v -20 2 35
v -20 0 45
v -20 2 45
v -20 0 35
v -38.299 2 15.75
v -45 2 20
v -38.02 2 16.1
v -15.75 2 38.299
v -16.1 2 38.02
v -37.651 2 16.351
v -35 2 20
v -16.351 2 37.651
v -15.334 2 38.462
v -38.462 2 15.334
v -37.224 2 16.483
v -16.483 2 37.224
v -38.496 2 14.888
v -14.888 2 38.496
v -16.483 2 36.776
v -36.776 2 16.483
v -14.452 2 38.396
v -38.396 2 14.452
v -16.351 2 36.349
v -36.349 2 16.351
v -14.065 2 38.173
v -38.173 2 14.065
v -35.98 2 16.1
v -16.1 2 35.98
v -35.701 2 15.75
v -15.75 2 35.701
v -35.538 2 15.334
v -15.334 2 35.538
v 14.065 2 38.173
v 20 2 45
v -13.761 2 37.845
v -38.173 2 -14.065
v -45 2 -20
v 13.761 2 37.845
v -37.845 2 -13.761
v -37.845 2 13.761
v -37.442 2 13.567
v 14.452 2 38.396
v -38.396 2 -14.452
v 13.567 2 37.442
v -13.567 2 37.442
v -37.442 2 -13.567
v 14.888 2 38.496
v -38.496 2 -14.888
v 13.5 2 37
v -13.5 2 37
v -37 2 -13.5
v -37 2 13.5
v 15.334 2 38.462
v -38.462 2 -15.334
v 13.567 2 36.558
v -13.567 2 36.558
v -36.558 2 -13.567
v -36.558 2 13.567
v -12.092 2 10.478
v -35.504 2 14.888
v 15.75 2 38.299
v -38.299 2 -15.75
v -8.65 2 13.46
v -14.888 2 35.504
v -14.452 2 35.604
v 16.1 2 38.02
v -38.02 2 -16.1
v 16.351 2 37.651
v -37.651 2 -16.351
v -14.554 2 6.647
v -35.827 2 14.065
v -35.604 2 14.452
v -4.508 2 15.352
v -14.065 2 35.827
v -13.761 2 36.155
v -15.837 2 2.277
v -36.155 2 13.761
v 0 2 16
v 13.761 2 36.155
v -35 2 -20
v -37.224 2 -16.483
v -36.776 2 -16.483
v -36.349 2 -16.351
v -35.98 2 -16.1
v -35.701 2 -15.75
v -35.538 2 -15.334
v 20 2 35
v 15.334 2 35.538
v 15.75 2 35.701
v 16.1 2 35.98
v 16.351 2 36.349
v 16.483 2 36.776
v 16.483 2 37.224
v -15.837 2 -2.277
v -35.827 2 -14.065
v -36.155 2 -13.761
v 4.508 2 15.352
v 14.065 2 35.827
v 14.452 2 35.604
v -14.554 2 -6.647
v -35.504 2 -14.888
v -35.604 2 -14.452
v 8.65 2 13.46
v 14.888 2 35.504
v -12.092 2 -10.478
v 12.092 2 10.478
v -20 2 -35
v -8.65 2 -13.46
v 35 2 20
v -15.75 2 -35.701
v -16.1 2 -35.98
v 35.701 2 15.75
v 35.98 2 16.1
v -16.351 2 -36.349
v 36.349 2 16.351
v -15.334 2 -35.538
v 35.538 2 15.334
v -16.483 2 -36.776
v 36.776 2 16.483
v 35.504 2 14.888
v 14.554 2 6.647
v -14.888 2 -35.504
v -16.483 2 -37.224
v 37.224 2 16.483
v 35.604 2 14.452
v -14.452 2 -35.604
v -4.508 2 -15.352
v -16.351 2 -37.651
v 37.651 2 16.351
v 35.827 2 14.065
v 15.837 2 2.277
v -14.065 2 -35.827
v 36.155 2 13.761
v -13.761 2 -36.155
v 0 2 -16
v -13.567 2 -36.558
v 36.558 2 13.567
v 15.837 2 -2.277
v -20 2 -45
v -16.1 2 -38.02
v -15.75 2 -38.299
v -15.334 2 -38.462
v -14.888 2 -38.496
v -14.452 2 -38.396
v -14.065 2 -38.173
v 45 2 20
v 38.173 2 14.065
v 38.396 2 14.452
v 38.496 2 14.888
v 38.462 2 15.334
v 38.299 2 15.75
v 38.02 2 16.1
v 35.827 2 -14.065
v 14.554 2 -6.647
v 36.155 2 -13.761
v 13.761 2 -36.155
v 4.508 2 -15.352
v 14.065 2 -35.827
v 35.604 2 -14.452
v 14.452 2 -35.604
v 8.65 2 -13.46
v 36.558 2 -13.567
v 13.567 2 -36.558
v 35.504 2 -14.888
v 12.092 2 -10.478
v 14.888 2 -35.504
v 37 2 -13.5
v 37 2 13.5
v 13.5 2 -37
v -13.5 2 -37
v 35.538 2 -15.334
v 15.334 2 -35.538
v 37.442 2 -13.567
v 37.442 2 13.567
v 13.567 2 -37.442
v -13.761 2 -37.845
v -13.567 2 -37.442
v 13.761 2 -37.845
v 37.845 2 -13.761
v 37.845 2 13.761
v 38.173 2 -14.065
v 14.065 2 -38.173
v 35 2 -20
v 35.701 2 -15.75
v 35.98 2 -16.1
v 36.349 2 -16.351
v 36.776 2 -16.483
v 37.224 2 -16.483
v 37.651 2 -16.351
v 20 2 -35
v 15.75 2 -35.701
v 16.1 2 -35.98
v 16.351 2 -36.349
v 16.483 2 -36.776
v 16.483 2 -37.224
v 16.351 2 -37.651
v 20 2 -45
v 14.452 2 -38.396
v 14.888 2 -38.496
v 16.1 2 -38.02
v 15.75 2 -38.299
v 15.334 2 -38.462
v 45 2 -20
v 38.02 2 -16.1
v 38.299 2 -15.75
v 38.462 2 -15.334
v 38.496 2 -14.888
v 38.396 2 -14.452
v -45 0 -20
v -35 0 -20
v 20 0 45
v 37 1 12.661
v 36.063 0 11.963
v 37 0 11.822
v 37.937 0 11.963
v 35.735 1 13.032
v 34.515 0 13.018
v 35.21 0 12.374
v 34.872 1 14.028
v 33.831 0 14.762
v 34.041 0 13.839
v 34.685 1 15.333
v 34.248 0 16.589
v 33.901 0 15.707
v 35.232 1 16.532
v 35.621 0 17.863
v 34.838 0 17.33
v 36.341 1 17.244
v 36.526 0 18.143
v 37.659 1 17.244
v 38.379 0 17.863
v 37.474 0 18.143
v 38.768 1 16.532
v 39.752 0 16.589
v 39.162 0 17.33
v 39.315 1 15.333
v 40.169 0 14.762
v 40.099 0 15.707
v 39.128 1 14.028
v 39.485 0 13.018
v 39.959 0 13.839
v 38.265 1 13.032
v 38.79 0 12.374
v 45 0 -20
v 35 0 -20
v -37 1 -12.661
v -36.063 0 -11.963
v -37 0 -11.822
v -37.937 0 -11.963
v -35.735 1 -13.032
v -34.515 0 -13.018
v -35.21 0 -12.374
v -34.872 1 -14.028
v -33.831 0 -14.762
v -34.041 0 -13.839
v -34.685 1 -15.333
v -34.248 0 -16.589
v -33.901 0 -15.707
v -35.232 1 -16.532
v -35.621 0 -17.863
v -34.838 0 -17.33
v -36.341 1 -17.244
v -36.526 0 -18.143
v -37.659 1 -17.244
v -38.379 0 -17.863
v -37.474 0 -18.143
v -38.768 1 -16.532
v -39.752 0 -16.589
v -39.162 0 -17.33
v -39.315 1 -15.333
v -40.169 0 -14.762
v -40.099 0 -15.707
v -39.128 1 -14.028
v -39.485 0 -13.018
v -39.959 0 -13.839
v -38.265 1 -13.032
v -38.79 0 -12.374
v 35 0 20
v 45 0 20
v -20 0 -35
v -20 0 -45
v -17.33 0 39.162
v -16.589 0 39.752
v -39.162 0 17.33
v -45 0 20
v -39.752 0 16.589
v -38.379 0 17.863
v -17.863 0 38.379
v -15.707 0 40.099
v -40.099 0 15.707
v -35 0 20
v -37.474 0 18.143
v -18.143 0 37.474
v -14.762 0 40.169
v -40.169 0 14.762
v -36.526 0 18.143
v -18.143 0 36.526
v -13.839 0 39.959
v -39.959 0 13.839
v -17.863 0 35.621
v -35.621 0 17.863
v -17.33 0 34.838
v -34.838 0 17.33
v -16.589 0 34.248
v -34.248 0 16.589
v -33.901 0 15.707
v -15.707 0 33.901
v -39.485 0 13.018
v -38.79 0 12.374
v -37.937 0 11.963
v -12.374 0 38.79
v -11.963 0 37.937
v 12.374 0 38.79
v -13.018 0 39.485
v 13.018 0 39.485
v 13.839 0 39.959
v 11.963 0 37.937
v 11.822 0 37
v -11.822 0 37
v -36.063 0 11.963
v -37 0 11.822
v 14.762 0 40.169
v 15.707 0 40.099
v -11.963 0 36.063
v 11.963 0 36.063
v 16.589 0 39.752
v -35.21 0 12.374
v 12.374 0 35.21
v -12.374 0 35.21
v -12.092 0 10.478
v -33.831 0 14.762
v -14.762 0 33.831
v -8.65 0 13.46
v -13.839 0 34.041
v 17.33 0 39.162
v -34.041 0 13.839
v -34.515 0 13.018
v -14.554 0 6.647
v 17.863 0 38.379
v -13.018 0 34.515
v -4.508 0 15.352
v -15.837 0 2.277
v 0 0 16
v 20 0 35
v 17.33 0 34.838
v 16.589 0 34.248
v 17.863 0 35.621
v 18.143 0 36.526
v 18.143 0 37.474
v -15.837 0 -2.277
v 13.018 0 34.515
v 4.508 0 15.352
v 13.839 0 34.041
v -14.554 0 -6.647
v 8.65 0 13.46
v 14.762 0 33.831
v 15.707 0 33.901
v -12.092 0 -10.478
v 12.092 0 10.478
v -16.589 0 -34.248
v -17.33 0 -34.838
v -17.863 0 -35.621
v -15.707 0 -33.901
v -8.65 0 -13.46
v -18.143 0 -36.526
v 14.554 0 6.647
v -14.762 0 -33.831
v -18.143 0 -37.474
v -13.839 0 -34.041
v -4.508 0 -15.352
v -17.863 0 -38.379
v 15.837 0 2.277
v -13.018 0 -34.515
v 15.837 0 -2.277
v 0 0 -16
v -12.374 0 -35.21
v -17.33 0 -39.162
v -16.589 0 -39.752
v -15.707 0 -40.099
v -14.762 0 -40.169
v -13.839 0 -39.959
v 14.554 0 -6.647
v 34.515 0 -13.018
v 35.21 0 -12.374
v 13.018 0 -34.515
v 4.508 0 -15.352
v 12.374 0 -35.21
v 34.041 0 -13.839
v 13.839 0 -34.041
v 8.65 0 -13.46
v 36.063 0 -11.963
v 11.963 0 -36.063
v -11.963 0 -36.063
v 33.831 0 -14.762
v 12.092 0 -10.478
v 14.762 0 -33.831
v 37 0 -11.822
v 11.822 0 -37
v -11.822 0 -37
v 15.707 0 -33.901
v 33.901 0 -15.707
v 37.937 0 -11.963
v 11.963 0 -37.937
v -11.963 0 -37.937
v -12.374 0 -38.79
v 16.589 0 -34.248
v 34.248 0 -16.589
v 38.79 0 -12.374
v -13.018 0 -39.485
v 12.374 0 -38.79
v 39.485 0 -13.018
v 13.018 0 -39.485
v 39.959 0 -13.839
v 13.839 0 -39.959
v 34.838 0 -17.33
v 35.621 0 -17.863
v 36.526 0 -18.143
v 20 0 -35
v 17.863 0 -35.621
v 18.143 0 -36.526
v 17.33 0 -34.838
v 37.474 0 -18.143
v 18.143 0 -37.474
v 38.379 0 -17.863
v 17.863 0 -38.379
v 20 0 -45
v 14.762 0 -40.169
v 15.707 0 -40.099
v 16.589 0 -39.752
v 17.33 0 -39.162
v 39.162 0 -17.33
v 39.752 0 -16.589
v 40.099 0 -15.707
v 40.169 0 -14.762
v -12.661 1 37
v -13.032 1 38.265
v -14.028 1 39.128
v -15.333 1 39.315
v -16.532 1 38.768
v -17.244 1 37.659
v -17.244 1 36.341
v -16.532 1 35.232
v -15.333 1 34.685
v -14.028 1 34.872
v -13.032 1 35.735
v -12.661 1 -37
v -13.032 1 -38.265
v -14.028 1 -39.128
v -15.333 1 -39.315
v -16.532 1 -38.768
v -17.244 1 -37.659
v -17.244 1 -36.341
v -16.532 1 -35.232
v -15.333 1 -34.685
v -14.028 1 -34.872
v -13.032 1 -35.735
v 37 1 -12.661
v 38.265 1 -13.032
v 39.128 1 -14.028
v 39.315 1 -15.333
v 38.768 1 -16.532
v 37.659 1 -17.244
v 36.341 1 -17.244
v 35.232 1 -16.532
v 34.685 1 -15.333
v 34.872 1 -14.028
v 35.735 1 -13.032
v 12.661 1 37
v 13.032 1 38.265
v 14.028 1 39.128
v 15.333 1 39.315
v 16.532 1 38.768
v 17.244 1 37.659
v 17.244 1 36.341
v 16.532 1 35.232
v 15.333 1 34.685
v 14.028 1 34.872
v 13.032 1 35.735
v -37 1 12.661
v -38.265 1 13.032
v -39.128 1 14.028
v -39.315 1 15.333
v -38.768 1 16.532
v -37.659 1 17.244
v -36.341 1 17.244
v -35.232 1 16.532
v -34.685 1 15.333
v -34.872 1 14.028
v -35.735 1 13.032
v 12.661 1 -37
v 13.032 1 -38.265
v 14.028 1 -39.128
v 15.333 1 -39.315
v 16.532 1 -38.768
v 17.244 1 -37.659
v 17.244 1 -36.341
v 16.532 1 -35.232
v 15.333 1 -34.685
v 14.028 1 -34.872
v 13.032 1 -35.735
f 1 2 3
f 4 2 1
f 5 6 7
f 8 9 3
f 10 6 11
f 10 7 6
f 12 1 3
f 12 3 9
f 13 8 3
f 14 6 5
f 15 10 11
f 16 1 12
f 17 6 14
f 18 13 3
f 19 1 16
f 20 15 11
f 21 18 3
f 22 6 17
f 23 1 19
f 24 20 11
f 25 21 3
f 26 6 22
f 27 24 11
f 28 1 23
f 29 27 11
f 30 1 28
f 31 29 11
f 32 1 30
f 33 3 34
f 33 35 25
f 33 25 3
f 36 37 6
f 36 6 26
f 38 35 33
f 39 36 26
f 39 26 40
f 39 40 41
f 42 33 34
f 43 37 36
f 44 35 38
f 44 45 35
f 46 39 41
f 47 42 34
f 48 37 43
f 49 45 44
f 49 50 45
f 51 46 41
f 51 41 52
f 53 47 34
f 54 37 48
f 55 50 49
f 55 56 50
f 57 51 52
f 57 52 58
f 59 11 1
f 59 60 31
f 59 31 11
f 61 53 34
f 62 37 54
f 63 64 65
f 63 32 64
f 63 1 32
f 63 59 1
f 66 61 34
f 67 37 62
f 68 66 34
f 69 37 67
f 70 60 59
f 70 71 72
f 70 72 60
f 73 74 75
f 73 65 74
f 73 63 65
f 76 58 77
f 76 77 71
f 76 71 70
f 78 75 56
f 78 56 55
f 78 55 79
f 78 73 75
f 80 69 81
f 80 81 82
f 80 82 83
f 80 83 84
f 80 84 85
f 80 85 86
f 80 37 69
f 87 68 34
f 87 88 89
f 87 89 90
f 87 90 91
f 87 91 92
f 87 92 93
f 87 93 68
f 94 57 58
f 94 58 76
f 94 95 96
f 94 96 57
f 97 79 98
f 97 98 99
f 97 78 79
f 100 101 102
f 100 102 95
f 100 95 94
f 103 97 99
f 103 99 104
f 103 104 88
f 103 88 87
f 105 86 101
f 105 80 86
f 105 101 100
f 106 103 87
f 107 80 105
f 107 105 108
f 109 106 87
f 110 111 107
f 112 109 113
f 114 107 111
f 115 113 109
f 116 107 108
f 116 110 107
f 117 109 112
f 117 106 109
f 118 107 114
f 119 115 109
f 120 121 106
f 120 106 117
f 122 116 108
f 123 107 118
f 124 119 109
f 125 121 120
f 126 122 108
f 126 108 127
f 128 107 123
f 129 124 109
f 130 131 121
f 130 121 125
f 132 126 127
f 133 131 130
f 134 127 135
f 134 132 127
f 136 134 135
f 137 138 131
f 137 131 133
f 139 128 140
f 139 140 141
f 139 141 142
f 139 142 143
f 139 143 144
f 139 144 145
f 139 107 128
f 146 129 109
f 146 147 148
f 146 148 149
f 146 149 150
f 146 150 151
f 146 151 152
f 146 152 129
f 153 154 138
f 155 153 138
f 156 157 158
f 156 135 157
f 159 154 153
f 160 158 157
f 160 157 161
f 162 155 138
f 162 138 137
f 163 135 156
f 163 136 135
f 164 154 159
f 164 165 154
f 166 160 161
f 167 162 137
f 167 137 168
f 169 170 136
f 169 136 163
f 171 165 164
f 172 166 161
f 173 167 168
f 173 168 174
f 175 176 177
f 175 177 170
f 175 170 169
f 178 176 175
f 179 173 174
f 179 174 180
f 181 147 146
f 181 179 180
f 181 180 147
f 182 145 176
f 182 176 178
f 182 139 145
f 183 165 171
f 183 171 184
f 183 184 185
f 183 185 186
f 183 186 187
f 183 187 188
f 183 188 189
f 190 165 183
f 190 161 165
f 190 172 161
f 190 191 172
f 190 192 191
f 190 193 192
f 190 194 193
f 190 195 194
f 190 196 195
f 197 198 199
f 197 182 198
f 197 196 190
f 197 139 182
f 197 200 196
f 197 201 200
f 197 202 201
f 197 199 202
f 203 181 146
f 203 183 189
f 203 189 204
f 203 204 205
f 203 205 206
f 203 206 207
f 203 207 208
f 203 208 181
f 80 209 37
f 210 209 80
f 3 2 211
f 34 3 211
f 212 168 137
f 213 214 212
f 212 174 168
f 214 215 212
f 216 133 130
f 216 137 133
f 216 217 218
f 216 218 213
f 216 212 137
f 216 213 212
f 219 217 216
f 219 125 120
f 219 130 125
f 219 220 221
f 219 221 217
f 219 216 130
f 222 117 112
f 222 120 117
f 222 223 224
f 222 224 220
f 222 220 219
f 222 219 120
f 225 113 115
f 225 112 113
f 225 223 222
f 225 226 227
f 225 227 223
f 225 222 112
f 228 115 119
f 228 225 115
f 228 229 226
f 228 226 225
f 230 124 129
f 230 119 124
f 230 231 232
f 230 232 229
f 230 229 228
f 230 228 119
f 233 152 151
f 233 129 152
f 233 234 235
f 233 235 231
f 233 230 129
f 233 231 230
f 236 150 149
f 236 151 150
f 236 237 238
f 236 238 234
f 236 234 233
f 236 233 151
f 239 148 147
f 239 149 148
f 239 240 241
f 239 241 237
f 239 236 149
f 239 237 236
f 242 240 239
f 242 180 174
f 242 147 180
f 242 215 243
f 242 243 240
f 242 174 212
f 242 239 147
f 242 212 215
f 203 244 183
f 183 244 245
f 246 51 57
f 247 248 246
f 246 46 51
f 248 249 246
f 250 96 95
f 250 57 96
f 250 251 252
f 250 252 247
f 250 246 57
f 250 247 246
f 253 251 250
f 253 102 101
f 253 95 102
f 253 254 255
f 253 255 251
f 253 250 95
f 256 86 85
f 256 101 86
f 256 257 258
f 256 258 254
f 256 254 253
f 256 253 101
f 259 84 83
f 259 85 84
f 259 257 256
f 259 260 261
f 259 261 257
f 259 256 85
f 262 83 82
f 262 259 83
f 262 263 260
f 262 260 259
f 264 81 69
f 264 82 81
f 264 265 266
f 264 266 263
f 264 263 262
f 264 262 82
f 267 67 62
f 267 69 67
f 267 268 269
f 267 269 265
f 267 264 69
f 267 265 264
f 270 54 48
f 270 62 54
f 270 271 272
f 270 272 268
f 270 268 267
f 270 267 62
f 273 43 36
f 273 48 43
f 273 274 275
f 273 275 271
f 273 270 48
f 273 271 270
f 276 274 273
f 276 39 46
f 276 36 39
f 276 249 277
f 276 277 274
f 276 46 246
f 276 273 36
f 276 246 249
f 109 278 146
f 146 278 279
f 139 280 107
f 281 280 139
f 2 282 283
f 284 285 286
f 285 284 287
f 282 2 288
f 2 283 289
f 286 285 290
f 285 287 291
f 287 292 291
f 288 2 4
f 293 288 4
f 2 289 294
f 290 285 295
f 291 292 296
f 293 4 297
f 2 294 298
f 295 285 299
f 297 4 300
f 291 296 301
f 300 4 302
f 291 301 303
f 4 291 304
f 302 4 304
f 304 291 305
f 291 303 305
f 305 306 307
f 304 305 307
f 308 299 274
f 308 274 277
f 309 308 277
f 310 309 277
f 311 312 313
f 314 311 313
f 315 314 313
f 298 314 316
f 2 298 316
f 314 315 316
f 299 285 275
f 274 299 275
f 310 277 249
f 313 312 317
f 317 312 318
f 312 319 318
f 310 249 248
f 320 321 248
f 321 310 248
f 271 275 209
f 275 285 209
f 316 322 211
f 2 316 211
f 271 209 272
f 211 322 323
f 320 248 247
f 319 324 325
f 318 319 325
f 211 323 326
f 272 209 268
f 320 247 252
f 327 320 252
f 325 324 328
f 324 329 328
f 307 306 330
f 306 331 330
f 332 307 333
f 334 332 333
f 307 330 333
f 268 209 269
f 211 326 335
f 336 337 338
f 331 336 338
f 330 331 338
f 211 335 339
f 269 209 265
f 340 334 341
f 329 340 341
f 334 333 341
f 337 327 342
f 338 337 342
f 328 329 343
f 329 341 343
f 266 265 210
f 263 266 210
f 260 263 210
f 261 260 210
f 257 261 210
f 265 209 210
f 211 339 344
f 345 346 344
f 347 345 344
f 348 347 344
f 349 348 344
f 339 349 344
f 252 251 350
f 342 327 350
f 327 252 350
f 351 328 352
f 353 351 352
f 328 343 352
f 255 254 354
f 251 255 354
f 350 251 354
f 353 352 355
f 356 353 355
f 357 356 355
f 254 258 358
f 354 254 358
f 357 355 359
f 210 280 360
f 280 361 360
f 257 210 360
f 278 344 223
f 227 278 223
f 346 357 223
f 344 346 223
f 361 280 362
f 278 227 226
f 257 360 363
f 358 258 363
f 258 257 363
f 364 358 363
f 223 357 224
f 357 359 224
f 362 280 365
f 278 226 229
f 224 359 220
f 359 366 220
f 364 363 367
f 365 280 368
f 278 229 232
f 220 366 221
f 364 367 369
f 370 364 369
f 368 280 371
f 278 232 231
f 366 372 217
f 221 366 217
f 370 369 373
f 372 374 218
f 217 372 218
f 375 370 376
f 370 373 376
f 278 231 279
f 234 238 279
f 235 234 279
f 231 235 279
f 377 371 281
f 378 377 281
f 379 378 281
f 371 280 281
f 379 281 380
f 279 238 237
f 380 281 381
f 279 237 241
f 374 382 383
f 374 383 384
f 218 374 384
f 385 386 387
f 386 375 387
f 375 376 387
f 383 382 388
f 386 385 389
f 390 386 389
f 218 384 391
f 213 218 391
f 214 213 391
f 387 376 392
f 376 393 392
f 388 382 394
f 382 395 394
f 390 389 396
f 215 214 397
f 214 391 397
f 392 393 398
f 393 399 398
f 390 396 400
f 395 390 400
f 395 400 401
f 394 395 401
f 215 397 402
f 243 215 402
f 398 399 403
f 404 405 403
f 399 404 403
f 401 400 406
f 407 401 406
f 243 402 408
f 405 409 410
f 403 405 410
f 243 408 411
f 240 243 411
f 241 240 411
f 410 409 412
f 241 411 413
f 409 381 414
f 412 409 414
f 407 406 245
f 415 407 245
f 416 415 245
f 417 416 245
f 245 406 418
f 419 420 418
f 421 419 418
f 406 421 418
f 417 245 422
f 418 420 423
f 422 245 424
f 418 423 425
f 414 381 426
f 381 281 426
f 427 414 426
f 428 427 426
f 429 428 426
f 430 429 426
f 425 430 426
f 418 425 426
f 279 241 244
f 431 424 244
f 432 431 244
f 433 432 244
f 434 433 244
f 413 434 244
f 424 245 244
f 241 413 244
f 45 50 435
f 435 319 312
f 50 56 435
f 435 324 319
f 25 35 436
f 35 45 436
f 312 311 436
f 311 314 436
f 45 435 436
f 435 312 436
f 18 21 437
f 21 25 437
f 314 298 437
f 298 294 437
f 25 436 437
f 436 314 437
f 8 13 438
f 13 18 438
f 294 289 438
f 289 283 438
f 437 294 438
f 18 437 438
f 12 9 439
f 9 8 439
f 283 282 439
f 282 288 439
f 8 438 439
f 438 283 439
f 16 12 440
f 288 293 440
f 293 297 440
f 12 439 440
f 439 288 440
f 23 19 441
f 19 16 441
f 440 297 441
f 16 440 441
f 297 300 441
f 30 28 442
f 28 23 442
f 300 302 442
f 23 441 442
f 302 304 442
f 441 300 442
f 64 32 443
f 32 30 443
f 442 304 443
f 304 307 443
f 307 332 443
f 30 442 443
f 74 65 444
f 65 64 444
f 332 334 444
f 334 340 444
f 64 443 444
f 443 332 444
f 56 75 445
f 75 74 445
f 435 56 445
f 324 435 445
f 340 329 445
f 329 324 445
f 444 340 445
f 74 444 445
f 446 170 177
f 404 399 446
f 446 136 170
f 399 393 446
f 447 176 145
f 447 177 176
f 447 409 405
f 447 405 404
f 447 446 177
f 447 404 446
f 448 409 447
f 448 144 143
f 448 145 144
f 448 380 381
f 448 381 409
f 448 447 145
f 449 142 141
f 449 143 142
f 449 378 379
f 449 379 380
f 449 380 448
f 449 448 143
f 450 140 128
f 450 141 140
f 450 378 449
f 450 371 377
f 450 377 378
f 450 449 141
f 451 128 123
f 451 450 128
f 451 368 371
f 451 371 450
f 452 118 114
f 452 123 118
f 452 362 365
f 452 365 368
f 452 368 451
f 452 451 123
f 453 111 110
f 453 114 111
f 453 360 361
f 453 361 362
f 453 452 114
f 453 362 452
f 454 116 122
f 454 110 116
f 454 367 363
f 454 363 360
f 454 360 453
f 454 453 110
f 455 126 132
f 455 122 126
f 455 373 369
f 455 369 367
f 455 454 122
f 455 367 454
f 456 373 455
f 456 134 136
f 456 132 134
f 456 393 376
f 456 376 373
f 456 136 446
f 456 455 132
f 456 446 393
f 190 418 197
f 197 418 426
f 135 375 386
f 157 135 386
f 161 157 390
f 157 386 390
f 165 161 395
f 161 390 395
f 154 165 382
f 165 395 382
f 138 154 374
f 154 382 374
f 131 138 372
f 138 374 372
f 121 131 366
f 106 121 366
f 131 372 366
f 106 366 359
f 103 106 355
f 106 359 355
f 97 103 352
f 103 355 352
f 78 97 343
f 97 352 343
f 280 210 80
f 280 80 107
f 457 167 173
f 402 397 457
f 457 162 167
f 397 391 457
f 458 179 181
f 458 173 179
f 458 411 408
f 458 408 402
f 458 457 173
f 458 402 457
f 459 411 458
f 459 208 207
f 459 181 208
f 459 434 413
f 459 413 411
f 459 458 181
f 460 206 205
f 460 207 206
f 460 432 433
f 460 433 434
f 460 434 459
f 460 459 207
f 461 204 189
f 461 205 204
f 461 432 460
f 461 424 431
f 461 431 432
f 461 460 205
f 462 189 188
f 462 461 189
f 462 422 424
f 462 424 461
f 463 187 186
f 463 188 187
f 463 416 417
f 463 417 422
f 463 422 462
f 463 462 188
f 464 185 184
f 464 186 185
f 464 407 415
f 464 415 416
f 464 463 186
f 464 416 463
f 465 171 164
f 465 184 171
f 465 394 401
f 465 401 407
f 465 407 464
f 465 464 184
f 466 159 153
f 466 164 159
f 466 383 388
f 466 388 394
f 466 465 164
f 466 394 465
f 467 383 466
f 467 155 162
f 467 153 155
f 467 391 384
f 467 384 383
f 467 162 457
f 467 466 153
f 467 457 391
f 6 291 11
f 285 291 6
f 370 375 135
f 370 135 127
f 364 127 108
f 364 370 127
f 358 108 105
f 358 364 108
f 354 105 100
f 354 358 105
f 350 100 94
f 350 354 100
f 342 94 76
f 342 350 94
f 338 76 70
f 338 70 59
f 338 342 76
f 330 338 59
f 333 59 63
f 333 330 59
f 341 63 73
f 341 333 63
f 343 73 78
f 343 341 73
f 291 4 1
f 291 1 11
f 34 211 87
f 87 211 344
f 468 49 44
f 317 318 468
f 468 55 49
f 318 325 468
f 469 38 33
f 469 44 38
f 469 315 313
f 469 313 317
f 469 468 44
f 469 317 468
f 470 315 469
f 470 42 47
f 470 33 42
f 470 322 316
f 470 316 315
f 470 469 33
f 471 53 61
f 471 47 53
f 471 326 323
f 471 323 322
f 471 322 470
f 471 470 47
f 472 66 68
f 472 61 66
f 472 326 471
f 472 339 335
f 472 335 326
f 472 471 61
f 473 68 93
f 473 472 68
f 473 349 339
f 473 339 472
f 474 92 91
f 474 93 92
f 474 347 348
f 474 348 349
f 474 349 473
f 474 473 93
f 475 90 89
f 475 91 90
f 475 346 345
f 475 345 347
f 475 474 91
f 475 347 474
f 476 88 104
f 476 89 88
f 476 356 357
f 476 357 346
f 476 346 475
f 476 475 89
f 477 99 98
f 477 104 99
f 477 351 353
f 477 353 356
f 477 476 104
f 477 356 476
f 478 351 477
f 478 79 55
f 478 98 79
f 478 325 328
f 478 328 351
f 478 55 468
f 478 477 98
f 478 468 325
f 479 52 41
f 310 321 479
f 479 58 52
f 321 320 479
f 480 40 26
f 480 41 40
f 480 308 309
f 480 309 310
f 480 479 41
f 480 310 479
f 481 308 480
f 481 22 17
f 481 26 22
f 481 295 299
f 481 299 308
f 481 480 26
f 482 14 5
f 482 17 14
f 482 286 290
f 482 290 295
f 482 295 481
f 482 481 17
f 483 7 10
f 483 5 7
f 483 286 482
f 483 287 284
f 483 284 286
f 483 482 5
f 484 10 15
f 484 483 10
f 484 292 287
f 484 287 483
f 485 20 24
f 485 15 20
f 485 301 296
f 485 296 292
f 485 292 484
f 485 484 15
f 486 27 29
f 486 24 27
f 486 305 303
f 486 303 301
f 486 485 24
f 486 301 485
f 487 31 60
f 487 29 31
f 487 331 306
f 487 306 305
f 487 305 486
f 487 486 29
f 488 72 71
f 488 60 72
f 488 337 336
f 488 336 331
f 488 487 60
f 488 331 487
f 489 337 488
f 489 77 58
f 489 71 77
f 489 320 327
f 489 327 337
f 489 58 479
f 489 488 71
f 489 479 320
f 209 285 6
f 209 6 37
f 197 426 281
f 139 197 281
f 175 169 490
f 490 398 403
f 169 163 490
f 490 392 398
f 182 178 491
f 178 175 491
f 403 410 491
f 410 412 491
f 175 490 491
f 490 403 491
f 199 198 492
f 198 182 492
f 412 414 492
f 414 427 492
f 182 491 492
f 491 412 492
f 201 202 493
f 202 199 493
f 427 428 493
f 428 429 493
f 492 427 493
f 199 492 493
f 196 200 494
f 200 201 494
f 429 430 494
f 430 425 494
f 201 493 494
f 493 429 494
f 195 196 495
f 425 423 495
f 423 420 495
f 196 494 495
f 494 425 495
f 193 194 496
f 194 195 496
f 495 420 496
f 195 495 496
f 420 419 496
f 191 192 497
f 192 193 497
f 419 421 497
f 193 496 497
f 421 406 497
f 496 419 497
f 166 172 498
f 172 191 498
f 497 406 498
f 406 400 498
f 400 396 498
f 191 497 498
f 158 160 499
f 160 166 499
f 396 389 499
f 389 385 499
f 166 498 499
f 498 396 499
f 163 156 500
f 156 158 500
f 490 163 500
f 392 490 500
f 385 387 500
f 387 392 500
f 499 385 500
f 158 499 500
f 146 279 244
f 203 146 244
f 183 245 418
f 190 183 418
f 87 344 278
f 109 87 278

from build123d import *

# Parameters (mm, degrees)
RESSALTO_EXTRUS_O1_DEPTH        = 2
ESBO_O2_R                       = 1.5
CORTE_EXTRUS_O1_DEPTH           = 3
CORTE_EXTRUS_O1_TAPER           = -40
ESPELHAR3_COPY_1_SKETCH_R       = 1.5
ESPELHAR3_COPY_1_DEPTH          = 3
ESPELHAR3_COPY_1_TAPER          = -40
PADR_OCIRCULAR1_COUNT           = 2
PADR_OCIRCULAR1_ANGLE           = 90
PADR_OCIRCULAR1_COPY_1_SKETCH_R = 1.5
PADR_OCIRCULAR1_COPY_1_DEPTH    = 3
PADR_OCIRCULAR1_COPY_1_TAPER    = -40
PADR_OCIRCULAR1_COPY_2_SKETCH_R = 1.5
PADR_OCIRCULAR1_COPY_2_DEPTH    = 3
PADR_OCIRCULAR1_COPY_2_TAPER    = -40
PADR_OCIRCULAR1_COPY_3_SKETCH_R = 1.5
PADR_OCIRCULAR1_COPY_3_DEPTH    = 3
PADR_OCIRCULAR1_COPY_3_TAPER    = -40


with BuildPart() as part:
    # Esboço1 → Ressalto-extrusão1 (new body)
    with BuildSketch(Plane(origin=(0, 0, 0), x_dir=(1, 0, 0), z_dir=(0, 1, 0))):
        with BuildLine():
            Line((-20, 35), (-20, 45))
            Line((-20, 45), (0, 45))
            Line((0, 45), (0, 16))
            ThreePointArc((0, 16), (-16, 0), (0, -16))
            Line((0, -16), (0, -45))
            Line((0, -45), (-20, -45))
            Line((-20, -45), (-20, -35))
            Line((-20, -35), (-35, -20))
            Line((-35, -20), (-45, -20))
            Line((-45, -20), (-45, 20))
            Line((-45, 20), (-35, 20))
            Line((-35, 20), (-20, 35))
        make_face()
    ressalto_extrus_o1 = extrude(amount=RESSALTO_EXTRUS_O1_DEPTH)

    # Espelhar1: Ressalto-extrusão1 across plane
    add(ressalto_extrus_o1.mirror(Plane(origin=(0, 2, -16), x_dir=(0, 0, 1), z_dir=(-1, 0, 0))))

    # Esboço2 → Corte-extrusão1 (cut, through all)
    with BuildSketch(Plane(origin=(0, 2, 0), x_dir=(1, 0, 0), z_dir=(0, 1, 0))):
        with Locations((-15, 37)):
            Circle(ESBO_O2_R)
    corte_extrus_o1 = extrude(amount=-CORTE_EXTRUS_O1_DEPTH, taper=CORTE_EXTRUS_O1_TAPER, mode=Mode.SUBTRACT)

    # Espelhar2: Corte-extrusão1 across plane
    add(corte_extrus_o1.mirror(Plane(origin=(0, 0, 0), x_dir=(0, 0, 1), z_dir=(1, 0, 0))), mode=Mode.SUBTRACT)

    # Espelhar3: Corte-extrusão1 across plane
    add(corte_extrus_o1.mirror(Plane.XY), mode=Mode.SUBTRACT)

    # Espelhar3 copy 1 sketch → Espelhar3 copy 1 (cut, through all)
    with BuildSketch(Plane(origin=(0, 2, 0), x_dir=(-1, 0, 0), z_dir=(0, 1, 0))):
        with Locations((-15, 37)):
            Circle(ESPELHAR3_COPY_1_SKETCH_R)
    extrude(amount=-ESPELHAR3_COPY_1_DEPTH, taper=ESPELHAR3_COPY_1_TAPER, mode=Mode.SUBTRACT)

    # PadrãoCircular1: Corte-extrusão1 ×2 about axis
    padr_ocircular1_axis = Axis((0, 0, 0), (0, -1, 0))
    for i in range(1, PADR_OCIRCULAR1_COUNT):
        add(corte_extrus_o1.rotate(padr_ocircular1_axis, i * PADR_OCIRCULAR1_ANGLE / (PADR_OCIRCULAR1_COUNT - 1)), mode=Mode.SUBTRACT)

    # PadrãoCircular1 copy 1 sketch → PadrãoCircular1 copy 1 (cut, through all)
    with BuildSketch(Plane.ZX.offset(2)):
        with Locations((-15, -37)):
            Circle(PADR_OCIRCULAR1_COPY_1_SKETCH_R)
    extrude(amount=-PADR_OCIRCULAR1_COPY_1_DEPTH, taper=PADR_OCIRCULAR1_COPY_1_TAPER, mode=Mode.SUBTRACT)

    # PadrãoCircular1 copy 2 sketch → PadrãoCircular1 copy 2 (cut, through all)
    with BuildSketch(Plane(origin=(0, 2, 0), x_dir=(0, 0, -1), z_dir=(0, 1, 0))):
        with Locations((-15, 37)):
            Circle(PADR_OCIRCULAR1_COPY_2_SKETCH_R)
    extrude(amount=-PADR_OCIRCULAR1_COPY_2_DEPTH, taper=PADR_OCIRCULAR1_COPY_2_TAPER, mode=Mode.SUBTRACT)

    # PadrãoCircular1 copy 3 sketch → PadrãoCircular1 copy 3 (cut, through all)
    with BuildSketch(Plane(origin=(0, 2, 0), x_dir=(0, 0, -1), z_dir=(0, 1, 0))):
        with Locations((-15, -37)):
            Circle(PADR_OCIRCULAR1_COPY_3_SKETCH_R)
    extrude(amount=-PADR_OCIRCULAR1_COPY_3_DEPTH, taper=PADR_OCIRCULAR1_COPY_3_TAPER, mode=Mode.SUBTRACT)


solid = part.part
